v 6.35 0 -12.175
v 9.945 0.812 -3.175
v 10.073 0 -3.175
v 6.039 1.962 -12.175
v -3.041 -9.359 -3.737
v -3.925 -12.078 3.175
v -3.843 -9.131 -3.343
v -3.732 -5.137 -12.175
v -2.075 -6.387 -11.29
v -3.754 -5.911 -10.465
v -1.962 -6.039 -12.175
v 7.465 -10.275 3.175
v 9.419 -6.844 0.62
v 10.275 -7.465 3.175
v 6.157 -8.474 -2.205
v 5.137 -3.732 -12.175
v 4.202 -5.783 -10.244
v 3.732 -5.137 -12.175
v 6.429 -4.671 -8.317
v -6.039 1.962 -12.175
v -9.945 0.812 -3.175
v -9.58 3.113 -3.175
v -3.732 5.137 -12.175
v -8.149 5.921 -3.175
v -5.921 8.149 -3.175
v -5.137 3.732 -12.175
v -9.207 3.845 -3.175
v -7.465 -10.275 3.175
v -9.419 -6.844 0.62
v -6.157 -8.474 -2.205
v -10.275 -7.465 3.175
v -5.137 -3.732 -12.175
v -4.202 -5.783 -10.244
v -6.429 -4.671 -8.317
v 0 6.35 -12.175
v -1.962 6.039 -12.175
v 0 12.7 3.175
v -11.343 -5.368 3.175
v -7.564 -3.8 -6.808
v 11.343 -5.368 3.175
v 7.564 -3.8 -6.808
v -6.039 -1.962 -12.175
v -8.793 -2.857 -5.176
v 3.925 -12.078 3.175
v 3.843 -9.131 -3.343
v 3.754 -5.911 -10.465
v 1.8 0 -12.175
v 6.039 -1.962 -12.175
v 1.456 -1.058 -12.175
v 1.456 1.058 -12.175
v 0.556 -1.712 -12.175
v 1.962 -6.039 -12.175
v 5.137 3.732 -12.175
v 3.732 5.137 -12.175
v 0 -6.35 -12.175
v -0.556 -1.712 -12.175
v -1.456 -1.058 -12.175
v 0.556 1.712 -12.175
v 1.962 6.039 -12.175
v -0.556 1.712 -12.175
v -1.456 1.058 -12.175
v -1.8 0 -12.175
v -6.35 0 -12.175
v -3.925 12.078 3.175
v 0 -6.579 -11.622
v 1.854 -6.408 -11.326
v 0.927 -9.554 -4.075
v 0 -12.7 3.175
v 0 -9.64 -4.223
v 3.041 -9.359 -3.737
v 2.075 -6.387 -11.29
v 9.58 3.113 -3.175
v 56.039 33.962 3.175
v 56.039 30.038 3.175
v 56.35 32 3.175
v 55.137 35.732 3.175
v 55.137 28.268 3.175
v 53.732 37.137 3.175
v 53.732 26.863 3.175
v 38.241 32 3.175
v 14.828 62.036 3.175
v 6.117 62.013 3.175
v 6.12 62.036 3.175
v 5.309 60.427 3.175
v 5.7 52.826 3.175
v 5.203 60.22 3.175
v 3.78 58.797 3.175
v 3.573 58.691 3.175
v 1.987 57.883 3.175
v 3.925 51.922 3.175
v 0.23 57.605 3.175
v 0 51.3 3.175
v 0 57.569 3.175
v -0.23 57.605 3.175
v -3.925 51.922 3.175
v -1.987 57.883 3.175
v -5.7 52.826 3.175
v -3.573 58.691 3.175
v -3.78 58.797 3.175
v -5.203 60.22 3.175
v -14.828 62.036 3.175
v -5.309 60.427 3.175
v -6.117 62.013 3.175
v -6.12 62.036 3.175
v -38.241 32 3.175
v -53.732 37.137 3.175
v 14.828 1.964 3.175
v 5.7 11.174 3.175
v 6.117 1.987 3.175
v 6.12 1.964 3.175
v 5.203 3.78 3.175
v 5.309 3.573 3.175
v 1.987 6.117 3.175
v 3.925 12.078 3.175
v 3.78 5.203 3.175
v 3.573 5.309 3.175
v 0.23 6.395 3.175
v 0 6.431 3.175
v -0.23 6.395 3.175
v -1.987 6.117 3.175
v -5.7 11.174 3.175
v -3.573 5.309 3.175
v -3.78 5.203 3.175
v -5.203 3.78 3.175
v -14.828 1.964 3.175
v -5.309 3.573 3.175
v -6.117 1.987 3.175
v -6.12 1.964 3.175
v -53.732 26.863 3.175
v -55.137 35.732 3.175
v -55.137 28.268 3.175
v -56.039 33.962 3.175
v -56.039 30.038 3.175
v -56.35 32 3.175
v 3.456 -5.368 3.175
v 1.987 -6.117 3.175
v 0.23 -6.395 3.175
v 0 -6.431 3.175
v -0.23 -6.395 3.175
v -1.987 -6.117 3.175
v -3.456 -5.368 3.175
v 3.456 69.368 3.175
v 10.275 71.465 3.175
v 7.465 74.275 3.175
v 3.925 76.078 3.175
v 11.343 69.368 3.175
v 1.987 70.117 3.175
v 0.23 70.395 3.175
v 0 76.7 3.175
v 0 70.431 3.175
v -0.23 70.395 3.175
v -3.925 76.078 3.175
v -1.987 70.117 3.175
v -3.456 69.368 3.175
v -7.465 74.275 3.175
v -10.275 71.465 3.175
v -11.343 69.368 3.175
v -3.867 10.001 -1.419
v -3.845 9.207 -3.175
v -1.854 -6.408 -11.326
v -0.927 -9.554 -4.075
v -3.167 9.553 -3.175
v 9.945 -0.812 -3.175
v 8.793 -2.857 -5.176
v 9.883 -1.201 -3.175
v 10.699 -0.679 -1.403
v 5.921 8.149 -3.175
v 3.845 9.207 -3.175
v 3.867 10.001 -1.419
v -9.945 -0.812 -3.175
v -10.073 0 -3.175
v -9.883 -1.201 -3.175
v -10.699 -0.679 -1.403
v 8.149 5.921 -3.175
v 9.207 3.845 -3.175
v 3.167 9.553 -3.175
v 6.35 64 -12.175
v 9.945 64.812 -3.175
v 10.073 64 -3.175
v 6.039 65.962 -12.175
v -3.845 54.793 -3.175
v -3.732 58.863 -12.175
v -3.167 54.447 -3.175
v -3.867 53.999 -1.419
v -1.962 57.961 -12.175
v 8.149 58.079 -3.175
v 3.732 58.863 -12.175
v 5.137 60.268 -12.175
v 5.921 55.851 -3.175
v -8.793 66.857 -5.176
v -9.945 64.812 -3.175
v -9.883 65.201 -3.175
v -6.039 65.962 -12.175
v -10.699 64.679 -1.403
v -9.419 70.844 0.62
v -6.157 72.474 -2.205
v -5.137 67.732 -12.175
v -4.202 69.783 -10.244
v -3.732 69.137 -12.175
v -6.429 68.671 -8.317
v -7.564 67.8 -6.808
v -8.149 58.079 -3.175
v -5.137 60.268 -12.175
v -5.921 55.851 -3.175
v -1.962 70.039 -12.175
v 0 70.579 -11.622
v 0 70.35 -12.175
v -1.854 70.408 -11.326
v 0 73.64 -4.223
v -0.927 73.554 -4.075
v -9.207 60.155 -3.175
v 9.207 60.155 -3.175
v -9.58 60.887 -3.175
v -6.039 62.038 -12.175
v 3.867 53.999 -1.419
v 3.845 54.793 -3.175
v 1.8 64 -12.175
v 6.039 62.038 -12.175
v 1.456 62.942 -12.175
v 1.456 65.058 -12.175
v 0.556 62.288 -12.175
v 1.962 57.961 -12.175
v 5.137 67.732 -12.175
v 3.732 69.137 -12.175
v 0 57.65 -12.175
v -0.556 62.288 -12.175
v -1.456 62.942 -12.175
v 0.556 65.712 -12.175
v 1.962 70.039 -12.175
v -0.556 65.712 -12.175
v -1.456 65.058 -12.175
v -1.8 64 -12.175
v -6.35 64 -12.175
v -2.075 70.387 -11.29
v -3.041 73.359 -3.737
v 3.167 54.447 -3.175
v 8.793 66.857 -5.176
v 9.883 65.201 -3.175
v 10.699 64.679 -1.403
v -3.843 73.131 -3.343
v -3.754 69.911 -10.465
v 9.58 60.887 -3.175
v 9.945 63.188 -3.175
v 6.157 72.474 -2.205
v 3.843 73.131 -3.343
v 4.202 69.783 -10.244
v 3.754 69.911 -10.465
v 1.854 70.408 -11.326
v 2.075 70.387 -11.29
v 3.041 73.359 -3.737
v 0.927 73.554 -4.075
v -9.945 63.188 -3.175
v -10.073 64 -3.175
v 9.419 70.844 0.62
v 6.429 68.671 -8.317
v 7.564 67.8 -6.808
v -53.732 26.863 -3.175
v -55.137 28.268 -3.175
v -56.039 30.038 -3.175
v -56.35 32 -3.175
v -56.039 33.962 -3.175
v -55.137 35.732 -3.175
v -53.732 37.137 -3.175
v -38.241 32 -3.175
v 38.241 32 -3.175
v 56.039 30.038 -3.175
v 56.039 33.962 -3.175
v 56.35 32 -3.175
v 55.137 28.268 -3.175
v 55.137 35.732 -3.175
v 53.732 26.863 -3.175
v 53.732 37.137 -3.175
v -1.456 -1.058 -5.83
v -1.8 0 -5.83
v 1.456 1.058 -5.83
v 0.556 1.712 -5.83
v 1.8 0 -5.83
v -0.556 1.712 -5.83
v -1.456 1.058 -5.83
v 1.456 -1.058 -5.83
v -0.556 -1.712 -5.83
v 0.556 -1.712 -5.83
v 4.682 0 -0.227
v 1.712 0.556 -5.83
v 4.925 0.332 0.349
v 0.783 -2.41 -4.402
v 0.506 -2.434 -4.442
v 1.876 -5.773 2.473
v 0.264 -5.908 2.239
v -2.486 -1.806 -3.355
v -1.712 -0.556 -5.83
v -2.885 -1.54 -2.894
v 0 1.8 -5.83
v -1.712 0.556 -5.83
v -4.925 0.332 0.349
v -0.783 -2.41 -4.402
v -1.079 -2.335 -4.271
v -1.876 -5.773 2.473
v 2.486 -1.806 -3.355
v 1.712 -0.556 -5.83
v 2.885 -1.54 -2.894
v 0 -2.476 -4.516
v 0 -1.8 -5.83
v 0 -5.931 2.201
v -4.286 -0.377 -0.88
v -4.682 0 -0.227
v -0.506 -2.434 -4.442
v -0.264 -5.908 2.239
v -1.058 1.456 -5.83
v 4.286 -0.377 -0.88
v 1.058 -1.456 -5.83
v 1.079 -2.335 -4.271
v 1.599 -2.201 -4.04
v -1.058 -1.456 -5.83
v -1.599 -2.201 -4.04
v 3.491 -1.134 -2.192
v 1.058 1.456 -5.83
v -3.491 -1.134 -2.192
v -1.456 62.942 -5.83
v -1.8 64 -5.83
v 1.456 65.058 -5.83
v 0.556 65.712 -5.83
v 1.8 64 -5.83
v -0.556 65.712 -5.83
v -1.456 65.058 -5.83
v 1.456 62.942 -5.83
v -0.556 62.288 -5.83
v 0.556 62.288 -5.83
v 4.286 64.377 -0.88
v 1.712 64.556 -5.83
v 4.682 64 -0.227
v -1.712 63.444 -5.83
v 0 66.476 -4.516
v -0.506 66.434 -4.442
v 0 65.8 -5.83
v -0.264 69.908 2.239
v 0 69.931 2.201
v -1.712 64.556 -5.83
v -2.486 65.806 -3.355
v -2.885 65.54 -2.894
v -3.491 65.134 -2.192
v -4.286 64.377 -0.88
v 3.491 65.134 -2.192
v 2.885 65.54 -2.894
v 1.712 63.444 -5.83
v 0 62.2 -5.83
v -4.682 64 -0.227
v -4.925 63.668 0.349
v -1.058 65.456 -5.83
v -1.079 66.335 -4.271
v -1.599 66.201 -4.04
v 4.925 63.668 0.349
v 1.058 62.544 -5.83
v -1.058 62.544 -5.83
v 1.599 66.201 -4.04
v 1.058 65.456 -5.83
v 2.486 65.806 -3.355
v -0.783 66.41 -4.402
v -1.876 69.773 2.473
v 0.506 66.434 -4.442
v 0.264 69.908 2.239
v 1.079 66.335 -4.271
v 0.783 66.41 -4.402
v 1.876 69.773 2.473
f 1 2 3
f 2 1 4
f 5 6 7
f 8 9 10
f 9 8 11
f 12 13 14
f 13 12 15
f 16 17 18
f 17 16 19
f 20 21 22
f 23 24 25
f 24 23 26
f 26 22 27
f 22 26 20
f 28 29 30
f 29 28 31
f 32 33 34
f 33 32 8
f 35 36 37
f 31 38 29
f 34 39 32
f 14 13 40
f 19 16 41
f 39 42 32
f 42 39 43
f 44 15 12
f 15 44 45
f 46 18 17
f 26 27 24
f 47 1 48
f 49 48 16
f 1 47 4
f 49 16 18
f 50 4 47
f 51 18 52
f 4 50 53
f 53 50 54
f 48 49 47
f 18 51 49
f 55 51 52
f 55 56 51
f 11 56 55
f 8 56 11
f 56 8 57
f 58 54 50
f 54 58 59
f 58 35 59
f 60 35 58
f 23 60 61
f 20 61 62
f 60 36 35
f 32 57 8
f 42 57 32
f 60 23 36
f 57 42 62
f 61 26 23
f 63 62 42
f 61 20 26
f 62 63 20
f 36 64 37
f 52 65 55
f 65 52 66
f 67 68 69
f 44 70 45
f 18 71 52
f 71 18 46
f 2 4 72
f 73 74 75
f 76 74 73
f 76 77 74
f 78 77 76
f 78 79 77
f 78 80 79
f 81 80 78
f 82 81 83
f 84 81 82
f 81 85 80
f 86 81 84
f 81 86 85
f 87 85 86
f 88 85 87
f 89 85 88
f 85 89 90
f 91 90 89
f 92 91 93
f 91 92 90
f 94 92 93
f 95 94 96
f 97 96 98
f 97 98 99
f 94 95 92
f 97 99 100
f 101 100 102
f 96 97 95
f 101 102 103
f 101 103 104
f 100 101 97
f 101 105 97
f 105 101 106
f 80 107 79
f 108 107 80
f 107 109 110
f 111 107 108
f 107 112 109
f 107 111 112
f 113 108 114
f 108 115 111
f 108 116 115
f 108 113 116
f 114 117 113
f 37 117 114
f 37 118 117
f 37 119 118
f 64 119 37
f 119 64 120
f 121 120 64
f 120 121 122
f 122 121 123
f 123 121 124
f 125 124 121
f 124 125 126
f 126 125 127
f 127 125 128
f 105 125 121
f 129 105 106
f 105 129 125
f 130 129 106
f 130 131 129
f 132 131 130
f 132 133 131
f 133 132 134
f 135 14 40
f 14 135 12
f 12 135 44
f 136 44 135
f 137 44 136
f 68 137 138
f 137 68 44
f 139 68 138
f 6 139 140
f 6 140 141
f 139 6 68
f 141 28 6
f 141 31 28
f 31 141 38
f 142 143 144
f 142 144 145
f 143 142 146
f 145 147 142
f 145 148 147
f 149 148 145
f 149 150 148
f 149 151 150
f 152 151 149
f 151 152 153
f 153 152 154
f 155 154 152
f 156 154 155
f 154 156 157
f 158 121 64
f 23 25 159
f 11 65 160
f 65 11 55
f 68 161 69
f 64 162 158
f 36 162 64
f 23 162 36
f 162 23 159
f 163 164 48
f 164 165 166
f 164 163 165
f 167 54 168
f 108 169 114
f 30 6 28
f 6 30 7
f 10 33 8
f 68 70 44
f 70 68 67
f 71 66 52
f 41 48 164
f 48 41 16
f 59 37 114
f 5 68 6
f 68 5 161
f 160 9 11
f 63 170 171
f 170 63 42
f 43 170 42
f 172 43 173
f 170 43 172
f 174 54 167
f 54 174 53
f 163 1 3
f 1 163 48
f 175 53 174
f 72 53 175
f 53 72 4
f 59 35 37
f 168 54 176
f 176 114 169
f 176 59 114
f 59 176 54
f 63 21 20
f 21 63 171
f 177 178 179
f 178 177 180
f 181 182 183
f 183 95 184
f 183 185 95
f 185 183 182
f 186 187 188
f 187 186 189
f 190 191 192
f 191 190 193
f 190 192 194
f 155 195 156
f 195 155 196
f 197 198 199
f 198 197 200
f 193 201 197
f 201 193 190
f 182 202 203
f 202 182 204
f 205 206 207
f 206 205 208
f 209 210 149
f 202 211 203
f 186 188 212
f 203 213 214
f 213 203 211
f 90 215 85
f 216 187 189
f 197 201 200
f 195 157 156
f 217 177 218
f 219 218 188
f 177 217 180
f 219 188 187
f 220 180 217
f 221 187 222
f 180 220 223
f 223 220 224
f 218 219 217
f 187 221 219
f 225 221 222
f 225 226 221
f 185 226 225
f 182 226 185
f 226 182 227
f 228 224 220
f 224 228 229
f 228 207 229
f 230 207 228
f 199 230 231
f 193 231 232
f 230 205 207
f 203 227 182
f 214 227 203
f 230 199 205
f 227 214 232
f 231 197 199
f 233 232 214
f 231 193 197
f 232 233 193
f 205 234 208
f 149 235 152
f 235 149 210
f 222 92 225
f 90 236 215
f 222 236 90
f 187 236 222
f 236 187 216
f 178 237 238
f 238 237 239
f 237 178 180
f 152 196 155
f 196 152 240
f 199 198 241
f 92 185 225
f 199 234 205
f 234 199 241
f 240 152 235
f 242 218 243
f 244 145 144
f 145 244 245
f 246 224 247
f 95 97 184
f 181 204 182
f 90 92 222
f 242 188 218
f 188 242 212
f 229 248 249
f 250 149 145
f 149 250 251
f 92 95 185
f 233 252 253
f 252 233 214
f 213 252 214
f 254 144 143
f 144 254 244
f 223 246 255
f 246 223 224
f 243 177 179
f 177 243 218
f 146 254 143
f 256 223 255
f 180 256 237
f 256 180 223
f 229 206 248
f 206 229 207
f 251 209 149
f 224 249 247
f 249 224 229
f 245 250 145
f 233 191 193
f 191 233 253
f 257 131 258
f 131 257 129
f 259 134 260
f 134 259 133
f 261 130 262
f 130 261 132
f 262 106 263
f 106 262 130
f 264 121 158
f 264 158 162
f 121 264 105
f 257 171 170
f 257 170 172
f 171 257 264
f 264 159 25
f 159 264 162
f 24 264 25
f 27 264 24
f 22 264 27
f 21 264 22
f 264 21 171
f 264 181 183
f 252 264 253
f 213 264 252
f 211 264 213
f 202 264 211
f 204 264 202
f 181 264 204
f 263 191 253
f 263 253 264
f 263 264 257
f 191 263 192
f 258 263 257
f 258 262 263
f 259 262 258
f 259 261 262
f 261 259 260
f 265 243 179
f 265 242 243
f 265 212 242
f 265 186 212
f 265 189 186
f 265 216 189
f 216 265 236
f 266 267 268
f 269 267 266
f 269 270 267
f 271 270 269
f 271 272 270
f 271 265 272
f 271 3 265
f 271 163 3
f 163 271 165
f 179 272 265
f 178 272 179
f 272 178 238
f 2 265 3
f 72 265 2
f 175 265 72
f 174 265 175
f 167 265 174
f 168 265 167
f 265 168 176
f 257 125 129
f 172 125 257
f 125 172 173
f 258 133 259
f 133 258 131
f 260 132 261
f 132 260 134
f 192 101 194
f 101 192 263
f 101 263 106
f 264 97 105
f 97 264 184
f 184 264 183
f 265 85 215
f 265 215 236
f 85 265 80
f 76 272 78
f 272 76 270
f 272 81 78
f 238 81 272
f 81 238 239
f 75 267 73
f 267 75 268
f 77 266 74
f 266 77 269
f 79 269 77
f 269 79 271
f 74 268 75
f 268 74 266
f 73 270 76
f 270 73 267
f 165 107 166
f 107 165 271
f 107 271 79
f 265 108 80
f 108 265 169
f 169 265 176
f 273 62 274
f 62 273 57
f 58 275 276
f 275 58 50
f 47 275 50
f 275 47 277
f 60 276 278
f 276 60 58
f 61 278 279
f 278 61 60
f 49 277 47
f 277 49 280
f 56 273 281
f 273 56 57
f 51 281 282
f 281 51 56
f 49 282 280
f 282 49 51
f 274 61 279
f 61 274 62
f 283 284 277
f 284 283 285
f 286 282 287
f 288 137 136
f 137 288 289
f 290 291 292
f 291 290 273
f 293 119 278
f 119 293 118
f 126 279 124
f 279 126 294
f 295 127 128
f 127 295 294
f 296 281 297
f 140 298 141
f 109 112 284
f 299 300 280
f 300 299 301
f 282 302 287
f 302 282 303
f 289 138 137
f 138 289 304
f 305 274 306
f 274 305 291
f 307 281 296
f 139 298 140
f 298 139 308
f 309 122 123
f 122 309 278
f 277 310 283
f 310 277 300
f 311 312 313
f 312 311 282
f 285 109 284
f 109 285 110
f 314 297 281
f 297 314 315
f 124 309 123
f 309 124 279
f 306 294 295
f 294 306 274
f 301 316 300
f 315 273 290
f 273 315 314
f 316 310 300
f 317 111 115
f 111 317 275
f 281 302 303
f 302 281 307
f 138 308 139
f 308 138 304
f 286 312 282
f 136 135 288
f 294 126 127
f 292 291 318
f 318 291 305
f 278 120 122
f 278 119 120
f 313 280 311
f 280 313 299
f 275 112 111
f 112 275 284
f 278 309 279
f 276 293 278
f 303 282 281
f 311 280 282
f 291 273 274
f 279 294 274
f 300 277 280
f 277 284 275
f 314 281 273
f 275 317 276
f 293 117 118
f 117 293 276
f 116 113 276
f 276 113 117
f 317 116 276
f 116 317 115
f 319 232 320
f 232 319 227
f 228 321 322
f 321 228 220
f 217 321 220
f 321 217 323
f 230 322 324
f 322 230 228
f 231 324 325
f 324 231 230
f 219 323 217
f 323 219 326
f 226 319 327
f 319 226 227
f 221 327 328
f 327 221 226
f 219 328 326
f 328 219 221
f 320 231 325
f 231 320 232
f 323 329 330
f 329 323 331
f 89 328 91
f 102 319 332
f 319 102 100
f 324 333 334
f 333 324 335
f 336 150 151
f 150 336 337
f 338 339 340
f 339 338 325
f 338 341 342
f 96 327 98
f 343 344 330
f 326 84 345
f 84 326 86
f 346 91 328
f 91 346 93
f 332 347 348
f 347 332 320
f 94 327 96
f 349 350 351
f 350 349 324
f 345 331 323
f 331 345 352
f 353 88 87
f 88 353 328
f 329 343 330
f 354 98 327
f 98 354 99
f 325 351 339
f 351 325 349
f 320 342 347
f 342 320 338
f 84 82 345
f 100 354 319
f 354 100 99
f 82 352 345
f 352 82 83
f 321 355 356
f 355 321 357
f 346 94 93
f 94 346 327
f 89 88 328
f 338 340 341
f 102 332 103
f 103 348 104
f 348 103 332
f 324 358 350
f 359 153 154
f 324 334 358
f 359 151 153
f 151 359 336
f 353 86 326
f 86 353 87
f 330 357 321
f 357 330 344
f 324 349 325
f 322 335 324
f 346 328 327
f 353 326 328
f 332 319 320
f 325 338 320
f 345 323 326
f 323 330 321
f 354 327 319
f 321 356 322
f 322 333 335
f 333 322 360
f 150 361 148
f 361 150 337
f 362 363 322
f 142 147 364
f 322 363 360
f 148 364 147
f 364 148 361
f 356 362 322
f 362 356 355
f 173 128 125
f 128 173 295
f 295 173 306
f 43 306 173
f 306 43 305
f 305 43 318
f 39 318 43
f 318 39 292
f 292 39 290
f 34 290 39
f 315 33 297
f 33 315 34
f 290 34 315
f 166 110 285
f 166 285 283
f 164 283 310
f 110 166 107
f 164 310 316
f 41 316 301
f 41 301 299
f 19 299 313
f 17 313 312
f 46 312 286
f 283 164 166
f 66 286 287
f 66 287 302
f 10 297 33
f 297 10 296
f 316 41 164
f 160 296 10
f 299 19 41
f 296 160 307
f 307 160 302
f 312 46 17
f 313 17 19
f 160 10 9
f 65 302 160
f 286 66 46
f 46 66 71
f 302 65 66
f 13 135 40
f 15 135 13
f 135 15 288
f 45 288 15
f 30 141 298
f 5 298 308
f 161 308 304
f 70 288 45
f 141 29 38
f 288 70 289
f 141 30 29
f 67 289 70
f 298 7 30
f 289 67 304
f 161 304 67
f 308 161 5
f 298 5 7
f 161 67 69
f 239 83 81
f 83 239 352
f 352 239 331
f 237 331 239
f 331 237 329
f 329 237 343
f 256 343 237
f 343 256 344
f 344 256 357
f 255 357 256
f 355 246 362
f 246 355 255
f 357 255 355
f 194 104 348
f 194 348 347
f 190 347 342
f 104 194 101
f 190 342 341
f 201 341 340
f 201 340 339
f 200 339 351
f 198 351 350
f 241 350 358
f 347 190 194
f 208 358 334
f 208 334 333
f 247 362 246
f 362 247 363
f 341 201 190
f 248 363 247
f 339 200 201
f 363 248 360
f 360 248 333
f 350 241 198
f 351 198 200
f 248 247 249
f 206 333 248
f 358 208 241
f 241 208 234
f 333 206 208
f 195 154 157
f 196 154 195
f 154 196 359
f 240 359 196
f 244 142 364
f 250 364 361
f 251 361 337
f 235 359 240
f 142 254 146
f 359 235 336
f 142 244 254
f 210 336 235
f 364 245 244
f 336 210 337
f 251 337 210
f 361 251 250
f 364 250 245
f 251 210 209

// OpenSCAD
postSpacing = 78-14; // coordinates copied from Case.scad


inch = 25.4;
halfInch = inch / 2;
quarterInch = inch / 4;
thickness = quarterInch;
boltRadius = 1.8; // large enough for the bolt to drop through
boltHeadRadius = 3;
bossHeight = thickness;
halfSpan = 50;
anchorDepth = 9;

$fn = 50;

module boss(x, y, solid)
{
    translate ([x, y, -anchorDepth / 2])
    {
        if (solid > 0)
        {
            cylinder(h = bossHeight, r = quarterInch, center = true, $fn = 20);
            cylinder(h = anchorDepth + bossHeight, r1 = quarterInch, r2 = halfInch, center = true, $fn = 20);
        }
        else
        {
            cylinder(h = bossHeight + 30, r = boltRadius, center = true, $fn = 10);
            
            translate ([0, 0, bossHeight])
                cylinder(h = anchorDepth + bossHeight + 0.01, r1 = boltRadius, r2 = halfInch - boltHeadRadius, center = true, $fn = 20);
        }
    }
}

module disc(x, y)
{
    translate ([x, y, 0])
    {
        cylinder(h = bossHeight, r = quarterInch, center = true, $fn = 20);
    }
}

module bosses(solid)
{
    boss(0, 0, solid);
    boss(0, postSpacing, solid);
}

module frame()
{
    hull()
    {
        disc(0, 0);
        disc(-halfSpan, postSpacing / 2);
    }
    
    hull()
    {
        disc(-halfSpan, postSpacing / 2);
        disc(0, postSpacing);
    }
    
    hull()
    {
        disc(0, postSpacing);
        disc(halfSpan, postSpacing / 2);
    }
    
    hull()
    {
        disc(halfSpan, postSpacing / 2);
        disc(0, 0);
    }
}

difference()
{
    union()
    {
        bosses(1);
        frame();
    }
    
    bosses(0);
    
    translate([0, -(5.5 / 4) * quarterInch, -(anchorDepth )])
        rotate(a = [-30, 0, 0])
            cube([inch * 2, quarterInch, 2 * inch], center = true);
    
    translate([0, postSpacing + ((5.5 / 4) * quarterInch), -(anchorDepth )])
        rotate(a = [30, 0, 0])
            cube([inch * 2, quarterInch, 2 * inch], center = true);   
}

/*
linear_extrude(height = quarterInch, center = true)
polygon(
    points = 
    [
        [0, 0],
        [-halfSpan, holeSpacing / 2],
        [0, holeSpacing],
        [halfSpan, holeSpacing / 2],
    ],
    paths = [[0, 1, 2, 3]]);*/
